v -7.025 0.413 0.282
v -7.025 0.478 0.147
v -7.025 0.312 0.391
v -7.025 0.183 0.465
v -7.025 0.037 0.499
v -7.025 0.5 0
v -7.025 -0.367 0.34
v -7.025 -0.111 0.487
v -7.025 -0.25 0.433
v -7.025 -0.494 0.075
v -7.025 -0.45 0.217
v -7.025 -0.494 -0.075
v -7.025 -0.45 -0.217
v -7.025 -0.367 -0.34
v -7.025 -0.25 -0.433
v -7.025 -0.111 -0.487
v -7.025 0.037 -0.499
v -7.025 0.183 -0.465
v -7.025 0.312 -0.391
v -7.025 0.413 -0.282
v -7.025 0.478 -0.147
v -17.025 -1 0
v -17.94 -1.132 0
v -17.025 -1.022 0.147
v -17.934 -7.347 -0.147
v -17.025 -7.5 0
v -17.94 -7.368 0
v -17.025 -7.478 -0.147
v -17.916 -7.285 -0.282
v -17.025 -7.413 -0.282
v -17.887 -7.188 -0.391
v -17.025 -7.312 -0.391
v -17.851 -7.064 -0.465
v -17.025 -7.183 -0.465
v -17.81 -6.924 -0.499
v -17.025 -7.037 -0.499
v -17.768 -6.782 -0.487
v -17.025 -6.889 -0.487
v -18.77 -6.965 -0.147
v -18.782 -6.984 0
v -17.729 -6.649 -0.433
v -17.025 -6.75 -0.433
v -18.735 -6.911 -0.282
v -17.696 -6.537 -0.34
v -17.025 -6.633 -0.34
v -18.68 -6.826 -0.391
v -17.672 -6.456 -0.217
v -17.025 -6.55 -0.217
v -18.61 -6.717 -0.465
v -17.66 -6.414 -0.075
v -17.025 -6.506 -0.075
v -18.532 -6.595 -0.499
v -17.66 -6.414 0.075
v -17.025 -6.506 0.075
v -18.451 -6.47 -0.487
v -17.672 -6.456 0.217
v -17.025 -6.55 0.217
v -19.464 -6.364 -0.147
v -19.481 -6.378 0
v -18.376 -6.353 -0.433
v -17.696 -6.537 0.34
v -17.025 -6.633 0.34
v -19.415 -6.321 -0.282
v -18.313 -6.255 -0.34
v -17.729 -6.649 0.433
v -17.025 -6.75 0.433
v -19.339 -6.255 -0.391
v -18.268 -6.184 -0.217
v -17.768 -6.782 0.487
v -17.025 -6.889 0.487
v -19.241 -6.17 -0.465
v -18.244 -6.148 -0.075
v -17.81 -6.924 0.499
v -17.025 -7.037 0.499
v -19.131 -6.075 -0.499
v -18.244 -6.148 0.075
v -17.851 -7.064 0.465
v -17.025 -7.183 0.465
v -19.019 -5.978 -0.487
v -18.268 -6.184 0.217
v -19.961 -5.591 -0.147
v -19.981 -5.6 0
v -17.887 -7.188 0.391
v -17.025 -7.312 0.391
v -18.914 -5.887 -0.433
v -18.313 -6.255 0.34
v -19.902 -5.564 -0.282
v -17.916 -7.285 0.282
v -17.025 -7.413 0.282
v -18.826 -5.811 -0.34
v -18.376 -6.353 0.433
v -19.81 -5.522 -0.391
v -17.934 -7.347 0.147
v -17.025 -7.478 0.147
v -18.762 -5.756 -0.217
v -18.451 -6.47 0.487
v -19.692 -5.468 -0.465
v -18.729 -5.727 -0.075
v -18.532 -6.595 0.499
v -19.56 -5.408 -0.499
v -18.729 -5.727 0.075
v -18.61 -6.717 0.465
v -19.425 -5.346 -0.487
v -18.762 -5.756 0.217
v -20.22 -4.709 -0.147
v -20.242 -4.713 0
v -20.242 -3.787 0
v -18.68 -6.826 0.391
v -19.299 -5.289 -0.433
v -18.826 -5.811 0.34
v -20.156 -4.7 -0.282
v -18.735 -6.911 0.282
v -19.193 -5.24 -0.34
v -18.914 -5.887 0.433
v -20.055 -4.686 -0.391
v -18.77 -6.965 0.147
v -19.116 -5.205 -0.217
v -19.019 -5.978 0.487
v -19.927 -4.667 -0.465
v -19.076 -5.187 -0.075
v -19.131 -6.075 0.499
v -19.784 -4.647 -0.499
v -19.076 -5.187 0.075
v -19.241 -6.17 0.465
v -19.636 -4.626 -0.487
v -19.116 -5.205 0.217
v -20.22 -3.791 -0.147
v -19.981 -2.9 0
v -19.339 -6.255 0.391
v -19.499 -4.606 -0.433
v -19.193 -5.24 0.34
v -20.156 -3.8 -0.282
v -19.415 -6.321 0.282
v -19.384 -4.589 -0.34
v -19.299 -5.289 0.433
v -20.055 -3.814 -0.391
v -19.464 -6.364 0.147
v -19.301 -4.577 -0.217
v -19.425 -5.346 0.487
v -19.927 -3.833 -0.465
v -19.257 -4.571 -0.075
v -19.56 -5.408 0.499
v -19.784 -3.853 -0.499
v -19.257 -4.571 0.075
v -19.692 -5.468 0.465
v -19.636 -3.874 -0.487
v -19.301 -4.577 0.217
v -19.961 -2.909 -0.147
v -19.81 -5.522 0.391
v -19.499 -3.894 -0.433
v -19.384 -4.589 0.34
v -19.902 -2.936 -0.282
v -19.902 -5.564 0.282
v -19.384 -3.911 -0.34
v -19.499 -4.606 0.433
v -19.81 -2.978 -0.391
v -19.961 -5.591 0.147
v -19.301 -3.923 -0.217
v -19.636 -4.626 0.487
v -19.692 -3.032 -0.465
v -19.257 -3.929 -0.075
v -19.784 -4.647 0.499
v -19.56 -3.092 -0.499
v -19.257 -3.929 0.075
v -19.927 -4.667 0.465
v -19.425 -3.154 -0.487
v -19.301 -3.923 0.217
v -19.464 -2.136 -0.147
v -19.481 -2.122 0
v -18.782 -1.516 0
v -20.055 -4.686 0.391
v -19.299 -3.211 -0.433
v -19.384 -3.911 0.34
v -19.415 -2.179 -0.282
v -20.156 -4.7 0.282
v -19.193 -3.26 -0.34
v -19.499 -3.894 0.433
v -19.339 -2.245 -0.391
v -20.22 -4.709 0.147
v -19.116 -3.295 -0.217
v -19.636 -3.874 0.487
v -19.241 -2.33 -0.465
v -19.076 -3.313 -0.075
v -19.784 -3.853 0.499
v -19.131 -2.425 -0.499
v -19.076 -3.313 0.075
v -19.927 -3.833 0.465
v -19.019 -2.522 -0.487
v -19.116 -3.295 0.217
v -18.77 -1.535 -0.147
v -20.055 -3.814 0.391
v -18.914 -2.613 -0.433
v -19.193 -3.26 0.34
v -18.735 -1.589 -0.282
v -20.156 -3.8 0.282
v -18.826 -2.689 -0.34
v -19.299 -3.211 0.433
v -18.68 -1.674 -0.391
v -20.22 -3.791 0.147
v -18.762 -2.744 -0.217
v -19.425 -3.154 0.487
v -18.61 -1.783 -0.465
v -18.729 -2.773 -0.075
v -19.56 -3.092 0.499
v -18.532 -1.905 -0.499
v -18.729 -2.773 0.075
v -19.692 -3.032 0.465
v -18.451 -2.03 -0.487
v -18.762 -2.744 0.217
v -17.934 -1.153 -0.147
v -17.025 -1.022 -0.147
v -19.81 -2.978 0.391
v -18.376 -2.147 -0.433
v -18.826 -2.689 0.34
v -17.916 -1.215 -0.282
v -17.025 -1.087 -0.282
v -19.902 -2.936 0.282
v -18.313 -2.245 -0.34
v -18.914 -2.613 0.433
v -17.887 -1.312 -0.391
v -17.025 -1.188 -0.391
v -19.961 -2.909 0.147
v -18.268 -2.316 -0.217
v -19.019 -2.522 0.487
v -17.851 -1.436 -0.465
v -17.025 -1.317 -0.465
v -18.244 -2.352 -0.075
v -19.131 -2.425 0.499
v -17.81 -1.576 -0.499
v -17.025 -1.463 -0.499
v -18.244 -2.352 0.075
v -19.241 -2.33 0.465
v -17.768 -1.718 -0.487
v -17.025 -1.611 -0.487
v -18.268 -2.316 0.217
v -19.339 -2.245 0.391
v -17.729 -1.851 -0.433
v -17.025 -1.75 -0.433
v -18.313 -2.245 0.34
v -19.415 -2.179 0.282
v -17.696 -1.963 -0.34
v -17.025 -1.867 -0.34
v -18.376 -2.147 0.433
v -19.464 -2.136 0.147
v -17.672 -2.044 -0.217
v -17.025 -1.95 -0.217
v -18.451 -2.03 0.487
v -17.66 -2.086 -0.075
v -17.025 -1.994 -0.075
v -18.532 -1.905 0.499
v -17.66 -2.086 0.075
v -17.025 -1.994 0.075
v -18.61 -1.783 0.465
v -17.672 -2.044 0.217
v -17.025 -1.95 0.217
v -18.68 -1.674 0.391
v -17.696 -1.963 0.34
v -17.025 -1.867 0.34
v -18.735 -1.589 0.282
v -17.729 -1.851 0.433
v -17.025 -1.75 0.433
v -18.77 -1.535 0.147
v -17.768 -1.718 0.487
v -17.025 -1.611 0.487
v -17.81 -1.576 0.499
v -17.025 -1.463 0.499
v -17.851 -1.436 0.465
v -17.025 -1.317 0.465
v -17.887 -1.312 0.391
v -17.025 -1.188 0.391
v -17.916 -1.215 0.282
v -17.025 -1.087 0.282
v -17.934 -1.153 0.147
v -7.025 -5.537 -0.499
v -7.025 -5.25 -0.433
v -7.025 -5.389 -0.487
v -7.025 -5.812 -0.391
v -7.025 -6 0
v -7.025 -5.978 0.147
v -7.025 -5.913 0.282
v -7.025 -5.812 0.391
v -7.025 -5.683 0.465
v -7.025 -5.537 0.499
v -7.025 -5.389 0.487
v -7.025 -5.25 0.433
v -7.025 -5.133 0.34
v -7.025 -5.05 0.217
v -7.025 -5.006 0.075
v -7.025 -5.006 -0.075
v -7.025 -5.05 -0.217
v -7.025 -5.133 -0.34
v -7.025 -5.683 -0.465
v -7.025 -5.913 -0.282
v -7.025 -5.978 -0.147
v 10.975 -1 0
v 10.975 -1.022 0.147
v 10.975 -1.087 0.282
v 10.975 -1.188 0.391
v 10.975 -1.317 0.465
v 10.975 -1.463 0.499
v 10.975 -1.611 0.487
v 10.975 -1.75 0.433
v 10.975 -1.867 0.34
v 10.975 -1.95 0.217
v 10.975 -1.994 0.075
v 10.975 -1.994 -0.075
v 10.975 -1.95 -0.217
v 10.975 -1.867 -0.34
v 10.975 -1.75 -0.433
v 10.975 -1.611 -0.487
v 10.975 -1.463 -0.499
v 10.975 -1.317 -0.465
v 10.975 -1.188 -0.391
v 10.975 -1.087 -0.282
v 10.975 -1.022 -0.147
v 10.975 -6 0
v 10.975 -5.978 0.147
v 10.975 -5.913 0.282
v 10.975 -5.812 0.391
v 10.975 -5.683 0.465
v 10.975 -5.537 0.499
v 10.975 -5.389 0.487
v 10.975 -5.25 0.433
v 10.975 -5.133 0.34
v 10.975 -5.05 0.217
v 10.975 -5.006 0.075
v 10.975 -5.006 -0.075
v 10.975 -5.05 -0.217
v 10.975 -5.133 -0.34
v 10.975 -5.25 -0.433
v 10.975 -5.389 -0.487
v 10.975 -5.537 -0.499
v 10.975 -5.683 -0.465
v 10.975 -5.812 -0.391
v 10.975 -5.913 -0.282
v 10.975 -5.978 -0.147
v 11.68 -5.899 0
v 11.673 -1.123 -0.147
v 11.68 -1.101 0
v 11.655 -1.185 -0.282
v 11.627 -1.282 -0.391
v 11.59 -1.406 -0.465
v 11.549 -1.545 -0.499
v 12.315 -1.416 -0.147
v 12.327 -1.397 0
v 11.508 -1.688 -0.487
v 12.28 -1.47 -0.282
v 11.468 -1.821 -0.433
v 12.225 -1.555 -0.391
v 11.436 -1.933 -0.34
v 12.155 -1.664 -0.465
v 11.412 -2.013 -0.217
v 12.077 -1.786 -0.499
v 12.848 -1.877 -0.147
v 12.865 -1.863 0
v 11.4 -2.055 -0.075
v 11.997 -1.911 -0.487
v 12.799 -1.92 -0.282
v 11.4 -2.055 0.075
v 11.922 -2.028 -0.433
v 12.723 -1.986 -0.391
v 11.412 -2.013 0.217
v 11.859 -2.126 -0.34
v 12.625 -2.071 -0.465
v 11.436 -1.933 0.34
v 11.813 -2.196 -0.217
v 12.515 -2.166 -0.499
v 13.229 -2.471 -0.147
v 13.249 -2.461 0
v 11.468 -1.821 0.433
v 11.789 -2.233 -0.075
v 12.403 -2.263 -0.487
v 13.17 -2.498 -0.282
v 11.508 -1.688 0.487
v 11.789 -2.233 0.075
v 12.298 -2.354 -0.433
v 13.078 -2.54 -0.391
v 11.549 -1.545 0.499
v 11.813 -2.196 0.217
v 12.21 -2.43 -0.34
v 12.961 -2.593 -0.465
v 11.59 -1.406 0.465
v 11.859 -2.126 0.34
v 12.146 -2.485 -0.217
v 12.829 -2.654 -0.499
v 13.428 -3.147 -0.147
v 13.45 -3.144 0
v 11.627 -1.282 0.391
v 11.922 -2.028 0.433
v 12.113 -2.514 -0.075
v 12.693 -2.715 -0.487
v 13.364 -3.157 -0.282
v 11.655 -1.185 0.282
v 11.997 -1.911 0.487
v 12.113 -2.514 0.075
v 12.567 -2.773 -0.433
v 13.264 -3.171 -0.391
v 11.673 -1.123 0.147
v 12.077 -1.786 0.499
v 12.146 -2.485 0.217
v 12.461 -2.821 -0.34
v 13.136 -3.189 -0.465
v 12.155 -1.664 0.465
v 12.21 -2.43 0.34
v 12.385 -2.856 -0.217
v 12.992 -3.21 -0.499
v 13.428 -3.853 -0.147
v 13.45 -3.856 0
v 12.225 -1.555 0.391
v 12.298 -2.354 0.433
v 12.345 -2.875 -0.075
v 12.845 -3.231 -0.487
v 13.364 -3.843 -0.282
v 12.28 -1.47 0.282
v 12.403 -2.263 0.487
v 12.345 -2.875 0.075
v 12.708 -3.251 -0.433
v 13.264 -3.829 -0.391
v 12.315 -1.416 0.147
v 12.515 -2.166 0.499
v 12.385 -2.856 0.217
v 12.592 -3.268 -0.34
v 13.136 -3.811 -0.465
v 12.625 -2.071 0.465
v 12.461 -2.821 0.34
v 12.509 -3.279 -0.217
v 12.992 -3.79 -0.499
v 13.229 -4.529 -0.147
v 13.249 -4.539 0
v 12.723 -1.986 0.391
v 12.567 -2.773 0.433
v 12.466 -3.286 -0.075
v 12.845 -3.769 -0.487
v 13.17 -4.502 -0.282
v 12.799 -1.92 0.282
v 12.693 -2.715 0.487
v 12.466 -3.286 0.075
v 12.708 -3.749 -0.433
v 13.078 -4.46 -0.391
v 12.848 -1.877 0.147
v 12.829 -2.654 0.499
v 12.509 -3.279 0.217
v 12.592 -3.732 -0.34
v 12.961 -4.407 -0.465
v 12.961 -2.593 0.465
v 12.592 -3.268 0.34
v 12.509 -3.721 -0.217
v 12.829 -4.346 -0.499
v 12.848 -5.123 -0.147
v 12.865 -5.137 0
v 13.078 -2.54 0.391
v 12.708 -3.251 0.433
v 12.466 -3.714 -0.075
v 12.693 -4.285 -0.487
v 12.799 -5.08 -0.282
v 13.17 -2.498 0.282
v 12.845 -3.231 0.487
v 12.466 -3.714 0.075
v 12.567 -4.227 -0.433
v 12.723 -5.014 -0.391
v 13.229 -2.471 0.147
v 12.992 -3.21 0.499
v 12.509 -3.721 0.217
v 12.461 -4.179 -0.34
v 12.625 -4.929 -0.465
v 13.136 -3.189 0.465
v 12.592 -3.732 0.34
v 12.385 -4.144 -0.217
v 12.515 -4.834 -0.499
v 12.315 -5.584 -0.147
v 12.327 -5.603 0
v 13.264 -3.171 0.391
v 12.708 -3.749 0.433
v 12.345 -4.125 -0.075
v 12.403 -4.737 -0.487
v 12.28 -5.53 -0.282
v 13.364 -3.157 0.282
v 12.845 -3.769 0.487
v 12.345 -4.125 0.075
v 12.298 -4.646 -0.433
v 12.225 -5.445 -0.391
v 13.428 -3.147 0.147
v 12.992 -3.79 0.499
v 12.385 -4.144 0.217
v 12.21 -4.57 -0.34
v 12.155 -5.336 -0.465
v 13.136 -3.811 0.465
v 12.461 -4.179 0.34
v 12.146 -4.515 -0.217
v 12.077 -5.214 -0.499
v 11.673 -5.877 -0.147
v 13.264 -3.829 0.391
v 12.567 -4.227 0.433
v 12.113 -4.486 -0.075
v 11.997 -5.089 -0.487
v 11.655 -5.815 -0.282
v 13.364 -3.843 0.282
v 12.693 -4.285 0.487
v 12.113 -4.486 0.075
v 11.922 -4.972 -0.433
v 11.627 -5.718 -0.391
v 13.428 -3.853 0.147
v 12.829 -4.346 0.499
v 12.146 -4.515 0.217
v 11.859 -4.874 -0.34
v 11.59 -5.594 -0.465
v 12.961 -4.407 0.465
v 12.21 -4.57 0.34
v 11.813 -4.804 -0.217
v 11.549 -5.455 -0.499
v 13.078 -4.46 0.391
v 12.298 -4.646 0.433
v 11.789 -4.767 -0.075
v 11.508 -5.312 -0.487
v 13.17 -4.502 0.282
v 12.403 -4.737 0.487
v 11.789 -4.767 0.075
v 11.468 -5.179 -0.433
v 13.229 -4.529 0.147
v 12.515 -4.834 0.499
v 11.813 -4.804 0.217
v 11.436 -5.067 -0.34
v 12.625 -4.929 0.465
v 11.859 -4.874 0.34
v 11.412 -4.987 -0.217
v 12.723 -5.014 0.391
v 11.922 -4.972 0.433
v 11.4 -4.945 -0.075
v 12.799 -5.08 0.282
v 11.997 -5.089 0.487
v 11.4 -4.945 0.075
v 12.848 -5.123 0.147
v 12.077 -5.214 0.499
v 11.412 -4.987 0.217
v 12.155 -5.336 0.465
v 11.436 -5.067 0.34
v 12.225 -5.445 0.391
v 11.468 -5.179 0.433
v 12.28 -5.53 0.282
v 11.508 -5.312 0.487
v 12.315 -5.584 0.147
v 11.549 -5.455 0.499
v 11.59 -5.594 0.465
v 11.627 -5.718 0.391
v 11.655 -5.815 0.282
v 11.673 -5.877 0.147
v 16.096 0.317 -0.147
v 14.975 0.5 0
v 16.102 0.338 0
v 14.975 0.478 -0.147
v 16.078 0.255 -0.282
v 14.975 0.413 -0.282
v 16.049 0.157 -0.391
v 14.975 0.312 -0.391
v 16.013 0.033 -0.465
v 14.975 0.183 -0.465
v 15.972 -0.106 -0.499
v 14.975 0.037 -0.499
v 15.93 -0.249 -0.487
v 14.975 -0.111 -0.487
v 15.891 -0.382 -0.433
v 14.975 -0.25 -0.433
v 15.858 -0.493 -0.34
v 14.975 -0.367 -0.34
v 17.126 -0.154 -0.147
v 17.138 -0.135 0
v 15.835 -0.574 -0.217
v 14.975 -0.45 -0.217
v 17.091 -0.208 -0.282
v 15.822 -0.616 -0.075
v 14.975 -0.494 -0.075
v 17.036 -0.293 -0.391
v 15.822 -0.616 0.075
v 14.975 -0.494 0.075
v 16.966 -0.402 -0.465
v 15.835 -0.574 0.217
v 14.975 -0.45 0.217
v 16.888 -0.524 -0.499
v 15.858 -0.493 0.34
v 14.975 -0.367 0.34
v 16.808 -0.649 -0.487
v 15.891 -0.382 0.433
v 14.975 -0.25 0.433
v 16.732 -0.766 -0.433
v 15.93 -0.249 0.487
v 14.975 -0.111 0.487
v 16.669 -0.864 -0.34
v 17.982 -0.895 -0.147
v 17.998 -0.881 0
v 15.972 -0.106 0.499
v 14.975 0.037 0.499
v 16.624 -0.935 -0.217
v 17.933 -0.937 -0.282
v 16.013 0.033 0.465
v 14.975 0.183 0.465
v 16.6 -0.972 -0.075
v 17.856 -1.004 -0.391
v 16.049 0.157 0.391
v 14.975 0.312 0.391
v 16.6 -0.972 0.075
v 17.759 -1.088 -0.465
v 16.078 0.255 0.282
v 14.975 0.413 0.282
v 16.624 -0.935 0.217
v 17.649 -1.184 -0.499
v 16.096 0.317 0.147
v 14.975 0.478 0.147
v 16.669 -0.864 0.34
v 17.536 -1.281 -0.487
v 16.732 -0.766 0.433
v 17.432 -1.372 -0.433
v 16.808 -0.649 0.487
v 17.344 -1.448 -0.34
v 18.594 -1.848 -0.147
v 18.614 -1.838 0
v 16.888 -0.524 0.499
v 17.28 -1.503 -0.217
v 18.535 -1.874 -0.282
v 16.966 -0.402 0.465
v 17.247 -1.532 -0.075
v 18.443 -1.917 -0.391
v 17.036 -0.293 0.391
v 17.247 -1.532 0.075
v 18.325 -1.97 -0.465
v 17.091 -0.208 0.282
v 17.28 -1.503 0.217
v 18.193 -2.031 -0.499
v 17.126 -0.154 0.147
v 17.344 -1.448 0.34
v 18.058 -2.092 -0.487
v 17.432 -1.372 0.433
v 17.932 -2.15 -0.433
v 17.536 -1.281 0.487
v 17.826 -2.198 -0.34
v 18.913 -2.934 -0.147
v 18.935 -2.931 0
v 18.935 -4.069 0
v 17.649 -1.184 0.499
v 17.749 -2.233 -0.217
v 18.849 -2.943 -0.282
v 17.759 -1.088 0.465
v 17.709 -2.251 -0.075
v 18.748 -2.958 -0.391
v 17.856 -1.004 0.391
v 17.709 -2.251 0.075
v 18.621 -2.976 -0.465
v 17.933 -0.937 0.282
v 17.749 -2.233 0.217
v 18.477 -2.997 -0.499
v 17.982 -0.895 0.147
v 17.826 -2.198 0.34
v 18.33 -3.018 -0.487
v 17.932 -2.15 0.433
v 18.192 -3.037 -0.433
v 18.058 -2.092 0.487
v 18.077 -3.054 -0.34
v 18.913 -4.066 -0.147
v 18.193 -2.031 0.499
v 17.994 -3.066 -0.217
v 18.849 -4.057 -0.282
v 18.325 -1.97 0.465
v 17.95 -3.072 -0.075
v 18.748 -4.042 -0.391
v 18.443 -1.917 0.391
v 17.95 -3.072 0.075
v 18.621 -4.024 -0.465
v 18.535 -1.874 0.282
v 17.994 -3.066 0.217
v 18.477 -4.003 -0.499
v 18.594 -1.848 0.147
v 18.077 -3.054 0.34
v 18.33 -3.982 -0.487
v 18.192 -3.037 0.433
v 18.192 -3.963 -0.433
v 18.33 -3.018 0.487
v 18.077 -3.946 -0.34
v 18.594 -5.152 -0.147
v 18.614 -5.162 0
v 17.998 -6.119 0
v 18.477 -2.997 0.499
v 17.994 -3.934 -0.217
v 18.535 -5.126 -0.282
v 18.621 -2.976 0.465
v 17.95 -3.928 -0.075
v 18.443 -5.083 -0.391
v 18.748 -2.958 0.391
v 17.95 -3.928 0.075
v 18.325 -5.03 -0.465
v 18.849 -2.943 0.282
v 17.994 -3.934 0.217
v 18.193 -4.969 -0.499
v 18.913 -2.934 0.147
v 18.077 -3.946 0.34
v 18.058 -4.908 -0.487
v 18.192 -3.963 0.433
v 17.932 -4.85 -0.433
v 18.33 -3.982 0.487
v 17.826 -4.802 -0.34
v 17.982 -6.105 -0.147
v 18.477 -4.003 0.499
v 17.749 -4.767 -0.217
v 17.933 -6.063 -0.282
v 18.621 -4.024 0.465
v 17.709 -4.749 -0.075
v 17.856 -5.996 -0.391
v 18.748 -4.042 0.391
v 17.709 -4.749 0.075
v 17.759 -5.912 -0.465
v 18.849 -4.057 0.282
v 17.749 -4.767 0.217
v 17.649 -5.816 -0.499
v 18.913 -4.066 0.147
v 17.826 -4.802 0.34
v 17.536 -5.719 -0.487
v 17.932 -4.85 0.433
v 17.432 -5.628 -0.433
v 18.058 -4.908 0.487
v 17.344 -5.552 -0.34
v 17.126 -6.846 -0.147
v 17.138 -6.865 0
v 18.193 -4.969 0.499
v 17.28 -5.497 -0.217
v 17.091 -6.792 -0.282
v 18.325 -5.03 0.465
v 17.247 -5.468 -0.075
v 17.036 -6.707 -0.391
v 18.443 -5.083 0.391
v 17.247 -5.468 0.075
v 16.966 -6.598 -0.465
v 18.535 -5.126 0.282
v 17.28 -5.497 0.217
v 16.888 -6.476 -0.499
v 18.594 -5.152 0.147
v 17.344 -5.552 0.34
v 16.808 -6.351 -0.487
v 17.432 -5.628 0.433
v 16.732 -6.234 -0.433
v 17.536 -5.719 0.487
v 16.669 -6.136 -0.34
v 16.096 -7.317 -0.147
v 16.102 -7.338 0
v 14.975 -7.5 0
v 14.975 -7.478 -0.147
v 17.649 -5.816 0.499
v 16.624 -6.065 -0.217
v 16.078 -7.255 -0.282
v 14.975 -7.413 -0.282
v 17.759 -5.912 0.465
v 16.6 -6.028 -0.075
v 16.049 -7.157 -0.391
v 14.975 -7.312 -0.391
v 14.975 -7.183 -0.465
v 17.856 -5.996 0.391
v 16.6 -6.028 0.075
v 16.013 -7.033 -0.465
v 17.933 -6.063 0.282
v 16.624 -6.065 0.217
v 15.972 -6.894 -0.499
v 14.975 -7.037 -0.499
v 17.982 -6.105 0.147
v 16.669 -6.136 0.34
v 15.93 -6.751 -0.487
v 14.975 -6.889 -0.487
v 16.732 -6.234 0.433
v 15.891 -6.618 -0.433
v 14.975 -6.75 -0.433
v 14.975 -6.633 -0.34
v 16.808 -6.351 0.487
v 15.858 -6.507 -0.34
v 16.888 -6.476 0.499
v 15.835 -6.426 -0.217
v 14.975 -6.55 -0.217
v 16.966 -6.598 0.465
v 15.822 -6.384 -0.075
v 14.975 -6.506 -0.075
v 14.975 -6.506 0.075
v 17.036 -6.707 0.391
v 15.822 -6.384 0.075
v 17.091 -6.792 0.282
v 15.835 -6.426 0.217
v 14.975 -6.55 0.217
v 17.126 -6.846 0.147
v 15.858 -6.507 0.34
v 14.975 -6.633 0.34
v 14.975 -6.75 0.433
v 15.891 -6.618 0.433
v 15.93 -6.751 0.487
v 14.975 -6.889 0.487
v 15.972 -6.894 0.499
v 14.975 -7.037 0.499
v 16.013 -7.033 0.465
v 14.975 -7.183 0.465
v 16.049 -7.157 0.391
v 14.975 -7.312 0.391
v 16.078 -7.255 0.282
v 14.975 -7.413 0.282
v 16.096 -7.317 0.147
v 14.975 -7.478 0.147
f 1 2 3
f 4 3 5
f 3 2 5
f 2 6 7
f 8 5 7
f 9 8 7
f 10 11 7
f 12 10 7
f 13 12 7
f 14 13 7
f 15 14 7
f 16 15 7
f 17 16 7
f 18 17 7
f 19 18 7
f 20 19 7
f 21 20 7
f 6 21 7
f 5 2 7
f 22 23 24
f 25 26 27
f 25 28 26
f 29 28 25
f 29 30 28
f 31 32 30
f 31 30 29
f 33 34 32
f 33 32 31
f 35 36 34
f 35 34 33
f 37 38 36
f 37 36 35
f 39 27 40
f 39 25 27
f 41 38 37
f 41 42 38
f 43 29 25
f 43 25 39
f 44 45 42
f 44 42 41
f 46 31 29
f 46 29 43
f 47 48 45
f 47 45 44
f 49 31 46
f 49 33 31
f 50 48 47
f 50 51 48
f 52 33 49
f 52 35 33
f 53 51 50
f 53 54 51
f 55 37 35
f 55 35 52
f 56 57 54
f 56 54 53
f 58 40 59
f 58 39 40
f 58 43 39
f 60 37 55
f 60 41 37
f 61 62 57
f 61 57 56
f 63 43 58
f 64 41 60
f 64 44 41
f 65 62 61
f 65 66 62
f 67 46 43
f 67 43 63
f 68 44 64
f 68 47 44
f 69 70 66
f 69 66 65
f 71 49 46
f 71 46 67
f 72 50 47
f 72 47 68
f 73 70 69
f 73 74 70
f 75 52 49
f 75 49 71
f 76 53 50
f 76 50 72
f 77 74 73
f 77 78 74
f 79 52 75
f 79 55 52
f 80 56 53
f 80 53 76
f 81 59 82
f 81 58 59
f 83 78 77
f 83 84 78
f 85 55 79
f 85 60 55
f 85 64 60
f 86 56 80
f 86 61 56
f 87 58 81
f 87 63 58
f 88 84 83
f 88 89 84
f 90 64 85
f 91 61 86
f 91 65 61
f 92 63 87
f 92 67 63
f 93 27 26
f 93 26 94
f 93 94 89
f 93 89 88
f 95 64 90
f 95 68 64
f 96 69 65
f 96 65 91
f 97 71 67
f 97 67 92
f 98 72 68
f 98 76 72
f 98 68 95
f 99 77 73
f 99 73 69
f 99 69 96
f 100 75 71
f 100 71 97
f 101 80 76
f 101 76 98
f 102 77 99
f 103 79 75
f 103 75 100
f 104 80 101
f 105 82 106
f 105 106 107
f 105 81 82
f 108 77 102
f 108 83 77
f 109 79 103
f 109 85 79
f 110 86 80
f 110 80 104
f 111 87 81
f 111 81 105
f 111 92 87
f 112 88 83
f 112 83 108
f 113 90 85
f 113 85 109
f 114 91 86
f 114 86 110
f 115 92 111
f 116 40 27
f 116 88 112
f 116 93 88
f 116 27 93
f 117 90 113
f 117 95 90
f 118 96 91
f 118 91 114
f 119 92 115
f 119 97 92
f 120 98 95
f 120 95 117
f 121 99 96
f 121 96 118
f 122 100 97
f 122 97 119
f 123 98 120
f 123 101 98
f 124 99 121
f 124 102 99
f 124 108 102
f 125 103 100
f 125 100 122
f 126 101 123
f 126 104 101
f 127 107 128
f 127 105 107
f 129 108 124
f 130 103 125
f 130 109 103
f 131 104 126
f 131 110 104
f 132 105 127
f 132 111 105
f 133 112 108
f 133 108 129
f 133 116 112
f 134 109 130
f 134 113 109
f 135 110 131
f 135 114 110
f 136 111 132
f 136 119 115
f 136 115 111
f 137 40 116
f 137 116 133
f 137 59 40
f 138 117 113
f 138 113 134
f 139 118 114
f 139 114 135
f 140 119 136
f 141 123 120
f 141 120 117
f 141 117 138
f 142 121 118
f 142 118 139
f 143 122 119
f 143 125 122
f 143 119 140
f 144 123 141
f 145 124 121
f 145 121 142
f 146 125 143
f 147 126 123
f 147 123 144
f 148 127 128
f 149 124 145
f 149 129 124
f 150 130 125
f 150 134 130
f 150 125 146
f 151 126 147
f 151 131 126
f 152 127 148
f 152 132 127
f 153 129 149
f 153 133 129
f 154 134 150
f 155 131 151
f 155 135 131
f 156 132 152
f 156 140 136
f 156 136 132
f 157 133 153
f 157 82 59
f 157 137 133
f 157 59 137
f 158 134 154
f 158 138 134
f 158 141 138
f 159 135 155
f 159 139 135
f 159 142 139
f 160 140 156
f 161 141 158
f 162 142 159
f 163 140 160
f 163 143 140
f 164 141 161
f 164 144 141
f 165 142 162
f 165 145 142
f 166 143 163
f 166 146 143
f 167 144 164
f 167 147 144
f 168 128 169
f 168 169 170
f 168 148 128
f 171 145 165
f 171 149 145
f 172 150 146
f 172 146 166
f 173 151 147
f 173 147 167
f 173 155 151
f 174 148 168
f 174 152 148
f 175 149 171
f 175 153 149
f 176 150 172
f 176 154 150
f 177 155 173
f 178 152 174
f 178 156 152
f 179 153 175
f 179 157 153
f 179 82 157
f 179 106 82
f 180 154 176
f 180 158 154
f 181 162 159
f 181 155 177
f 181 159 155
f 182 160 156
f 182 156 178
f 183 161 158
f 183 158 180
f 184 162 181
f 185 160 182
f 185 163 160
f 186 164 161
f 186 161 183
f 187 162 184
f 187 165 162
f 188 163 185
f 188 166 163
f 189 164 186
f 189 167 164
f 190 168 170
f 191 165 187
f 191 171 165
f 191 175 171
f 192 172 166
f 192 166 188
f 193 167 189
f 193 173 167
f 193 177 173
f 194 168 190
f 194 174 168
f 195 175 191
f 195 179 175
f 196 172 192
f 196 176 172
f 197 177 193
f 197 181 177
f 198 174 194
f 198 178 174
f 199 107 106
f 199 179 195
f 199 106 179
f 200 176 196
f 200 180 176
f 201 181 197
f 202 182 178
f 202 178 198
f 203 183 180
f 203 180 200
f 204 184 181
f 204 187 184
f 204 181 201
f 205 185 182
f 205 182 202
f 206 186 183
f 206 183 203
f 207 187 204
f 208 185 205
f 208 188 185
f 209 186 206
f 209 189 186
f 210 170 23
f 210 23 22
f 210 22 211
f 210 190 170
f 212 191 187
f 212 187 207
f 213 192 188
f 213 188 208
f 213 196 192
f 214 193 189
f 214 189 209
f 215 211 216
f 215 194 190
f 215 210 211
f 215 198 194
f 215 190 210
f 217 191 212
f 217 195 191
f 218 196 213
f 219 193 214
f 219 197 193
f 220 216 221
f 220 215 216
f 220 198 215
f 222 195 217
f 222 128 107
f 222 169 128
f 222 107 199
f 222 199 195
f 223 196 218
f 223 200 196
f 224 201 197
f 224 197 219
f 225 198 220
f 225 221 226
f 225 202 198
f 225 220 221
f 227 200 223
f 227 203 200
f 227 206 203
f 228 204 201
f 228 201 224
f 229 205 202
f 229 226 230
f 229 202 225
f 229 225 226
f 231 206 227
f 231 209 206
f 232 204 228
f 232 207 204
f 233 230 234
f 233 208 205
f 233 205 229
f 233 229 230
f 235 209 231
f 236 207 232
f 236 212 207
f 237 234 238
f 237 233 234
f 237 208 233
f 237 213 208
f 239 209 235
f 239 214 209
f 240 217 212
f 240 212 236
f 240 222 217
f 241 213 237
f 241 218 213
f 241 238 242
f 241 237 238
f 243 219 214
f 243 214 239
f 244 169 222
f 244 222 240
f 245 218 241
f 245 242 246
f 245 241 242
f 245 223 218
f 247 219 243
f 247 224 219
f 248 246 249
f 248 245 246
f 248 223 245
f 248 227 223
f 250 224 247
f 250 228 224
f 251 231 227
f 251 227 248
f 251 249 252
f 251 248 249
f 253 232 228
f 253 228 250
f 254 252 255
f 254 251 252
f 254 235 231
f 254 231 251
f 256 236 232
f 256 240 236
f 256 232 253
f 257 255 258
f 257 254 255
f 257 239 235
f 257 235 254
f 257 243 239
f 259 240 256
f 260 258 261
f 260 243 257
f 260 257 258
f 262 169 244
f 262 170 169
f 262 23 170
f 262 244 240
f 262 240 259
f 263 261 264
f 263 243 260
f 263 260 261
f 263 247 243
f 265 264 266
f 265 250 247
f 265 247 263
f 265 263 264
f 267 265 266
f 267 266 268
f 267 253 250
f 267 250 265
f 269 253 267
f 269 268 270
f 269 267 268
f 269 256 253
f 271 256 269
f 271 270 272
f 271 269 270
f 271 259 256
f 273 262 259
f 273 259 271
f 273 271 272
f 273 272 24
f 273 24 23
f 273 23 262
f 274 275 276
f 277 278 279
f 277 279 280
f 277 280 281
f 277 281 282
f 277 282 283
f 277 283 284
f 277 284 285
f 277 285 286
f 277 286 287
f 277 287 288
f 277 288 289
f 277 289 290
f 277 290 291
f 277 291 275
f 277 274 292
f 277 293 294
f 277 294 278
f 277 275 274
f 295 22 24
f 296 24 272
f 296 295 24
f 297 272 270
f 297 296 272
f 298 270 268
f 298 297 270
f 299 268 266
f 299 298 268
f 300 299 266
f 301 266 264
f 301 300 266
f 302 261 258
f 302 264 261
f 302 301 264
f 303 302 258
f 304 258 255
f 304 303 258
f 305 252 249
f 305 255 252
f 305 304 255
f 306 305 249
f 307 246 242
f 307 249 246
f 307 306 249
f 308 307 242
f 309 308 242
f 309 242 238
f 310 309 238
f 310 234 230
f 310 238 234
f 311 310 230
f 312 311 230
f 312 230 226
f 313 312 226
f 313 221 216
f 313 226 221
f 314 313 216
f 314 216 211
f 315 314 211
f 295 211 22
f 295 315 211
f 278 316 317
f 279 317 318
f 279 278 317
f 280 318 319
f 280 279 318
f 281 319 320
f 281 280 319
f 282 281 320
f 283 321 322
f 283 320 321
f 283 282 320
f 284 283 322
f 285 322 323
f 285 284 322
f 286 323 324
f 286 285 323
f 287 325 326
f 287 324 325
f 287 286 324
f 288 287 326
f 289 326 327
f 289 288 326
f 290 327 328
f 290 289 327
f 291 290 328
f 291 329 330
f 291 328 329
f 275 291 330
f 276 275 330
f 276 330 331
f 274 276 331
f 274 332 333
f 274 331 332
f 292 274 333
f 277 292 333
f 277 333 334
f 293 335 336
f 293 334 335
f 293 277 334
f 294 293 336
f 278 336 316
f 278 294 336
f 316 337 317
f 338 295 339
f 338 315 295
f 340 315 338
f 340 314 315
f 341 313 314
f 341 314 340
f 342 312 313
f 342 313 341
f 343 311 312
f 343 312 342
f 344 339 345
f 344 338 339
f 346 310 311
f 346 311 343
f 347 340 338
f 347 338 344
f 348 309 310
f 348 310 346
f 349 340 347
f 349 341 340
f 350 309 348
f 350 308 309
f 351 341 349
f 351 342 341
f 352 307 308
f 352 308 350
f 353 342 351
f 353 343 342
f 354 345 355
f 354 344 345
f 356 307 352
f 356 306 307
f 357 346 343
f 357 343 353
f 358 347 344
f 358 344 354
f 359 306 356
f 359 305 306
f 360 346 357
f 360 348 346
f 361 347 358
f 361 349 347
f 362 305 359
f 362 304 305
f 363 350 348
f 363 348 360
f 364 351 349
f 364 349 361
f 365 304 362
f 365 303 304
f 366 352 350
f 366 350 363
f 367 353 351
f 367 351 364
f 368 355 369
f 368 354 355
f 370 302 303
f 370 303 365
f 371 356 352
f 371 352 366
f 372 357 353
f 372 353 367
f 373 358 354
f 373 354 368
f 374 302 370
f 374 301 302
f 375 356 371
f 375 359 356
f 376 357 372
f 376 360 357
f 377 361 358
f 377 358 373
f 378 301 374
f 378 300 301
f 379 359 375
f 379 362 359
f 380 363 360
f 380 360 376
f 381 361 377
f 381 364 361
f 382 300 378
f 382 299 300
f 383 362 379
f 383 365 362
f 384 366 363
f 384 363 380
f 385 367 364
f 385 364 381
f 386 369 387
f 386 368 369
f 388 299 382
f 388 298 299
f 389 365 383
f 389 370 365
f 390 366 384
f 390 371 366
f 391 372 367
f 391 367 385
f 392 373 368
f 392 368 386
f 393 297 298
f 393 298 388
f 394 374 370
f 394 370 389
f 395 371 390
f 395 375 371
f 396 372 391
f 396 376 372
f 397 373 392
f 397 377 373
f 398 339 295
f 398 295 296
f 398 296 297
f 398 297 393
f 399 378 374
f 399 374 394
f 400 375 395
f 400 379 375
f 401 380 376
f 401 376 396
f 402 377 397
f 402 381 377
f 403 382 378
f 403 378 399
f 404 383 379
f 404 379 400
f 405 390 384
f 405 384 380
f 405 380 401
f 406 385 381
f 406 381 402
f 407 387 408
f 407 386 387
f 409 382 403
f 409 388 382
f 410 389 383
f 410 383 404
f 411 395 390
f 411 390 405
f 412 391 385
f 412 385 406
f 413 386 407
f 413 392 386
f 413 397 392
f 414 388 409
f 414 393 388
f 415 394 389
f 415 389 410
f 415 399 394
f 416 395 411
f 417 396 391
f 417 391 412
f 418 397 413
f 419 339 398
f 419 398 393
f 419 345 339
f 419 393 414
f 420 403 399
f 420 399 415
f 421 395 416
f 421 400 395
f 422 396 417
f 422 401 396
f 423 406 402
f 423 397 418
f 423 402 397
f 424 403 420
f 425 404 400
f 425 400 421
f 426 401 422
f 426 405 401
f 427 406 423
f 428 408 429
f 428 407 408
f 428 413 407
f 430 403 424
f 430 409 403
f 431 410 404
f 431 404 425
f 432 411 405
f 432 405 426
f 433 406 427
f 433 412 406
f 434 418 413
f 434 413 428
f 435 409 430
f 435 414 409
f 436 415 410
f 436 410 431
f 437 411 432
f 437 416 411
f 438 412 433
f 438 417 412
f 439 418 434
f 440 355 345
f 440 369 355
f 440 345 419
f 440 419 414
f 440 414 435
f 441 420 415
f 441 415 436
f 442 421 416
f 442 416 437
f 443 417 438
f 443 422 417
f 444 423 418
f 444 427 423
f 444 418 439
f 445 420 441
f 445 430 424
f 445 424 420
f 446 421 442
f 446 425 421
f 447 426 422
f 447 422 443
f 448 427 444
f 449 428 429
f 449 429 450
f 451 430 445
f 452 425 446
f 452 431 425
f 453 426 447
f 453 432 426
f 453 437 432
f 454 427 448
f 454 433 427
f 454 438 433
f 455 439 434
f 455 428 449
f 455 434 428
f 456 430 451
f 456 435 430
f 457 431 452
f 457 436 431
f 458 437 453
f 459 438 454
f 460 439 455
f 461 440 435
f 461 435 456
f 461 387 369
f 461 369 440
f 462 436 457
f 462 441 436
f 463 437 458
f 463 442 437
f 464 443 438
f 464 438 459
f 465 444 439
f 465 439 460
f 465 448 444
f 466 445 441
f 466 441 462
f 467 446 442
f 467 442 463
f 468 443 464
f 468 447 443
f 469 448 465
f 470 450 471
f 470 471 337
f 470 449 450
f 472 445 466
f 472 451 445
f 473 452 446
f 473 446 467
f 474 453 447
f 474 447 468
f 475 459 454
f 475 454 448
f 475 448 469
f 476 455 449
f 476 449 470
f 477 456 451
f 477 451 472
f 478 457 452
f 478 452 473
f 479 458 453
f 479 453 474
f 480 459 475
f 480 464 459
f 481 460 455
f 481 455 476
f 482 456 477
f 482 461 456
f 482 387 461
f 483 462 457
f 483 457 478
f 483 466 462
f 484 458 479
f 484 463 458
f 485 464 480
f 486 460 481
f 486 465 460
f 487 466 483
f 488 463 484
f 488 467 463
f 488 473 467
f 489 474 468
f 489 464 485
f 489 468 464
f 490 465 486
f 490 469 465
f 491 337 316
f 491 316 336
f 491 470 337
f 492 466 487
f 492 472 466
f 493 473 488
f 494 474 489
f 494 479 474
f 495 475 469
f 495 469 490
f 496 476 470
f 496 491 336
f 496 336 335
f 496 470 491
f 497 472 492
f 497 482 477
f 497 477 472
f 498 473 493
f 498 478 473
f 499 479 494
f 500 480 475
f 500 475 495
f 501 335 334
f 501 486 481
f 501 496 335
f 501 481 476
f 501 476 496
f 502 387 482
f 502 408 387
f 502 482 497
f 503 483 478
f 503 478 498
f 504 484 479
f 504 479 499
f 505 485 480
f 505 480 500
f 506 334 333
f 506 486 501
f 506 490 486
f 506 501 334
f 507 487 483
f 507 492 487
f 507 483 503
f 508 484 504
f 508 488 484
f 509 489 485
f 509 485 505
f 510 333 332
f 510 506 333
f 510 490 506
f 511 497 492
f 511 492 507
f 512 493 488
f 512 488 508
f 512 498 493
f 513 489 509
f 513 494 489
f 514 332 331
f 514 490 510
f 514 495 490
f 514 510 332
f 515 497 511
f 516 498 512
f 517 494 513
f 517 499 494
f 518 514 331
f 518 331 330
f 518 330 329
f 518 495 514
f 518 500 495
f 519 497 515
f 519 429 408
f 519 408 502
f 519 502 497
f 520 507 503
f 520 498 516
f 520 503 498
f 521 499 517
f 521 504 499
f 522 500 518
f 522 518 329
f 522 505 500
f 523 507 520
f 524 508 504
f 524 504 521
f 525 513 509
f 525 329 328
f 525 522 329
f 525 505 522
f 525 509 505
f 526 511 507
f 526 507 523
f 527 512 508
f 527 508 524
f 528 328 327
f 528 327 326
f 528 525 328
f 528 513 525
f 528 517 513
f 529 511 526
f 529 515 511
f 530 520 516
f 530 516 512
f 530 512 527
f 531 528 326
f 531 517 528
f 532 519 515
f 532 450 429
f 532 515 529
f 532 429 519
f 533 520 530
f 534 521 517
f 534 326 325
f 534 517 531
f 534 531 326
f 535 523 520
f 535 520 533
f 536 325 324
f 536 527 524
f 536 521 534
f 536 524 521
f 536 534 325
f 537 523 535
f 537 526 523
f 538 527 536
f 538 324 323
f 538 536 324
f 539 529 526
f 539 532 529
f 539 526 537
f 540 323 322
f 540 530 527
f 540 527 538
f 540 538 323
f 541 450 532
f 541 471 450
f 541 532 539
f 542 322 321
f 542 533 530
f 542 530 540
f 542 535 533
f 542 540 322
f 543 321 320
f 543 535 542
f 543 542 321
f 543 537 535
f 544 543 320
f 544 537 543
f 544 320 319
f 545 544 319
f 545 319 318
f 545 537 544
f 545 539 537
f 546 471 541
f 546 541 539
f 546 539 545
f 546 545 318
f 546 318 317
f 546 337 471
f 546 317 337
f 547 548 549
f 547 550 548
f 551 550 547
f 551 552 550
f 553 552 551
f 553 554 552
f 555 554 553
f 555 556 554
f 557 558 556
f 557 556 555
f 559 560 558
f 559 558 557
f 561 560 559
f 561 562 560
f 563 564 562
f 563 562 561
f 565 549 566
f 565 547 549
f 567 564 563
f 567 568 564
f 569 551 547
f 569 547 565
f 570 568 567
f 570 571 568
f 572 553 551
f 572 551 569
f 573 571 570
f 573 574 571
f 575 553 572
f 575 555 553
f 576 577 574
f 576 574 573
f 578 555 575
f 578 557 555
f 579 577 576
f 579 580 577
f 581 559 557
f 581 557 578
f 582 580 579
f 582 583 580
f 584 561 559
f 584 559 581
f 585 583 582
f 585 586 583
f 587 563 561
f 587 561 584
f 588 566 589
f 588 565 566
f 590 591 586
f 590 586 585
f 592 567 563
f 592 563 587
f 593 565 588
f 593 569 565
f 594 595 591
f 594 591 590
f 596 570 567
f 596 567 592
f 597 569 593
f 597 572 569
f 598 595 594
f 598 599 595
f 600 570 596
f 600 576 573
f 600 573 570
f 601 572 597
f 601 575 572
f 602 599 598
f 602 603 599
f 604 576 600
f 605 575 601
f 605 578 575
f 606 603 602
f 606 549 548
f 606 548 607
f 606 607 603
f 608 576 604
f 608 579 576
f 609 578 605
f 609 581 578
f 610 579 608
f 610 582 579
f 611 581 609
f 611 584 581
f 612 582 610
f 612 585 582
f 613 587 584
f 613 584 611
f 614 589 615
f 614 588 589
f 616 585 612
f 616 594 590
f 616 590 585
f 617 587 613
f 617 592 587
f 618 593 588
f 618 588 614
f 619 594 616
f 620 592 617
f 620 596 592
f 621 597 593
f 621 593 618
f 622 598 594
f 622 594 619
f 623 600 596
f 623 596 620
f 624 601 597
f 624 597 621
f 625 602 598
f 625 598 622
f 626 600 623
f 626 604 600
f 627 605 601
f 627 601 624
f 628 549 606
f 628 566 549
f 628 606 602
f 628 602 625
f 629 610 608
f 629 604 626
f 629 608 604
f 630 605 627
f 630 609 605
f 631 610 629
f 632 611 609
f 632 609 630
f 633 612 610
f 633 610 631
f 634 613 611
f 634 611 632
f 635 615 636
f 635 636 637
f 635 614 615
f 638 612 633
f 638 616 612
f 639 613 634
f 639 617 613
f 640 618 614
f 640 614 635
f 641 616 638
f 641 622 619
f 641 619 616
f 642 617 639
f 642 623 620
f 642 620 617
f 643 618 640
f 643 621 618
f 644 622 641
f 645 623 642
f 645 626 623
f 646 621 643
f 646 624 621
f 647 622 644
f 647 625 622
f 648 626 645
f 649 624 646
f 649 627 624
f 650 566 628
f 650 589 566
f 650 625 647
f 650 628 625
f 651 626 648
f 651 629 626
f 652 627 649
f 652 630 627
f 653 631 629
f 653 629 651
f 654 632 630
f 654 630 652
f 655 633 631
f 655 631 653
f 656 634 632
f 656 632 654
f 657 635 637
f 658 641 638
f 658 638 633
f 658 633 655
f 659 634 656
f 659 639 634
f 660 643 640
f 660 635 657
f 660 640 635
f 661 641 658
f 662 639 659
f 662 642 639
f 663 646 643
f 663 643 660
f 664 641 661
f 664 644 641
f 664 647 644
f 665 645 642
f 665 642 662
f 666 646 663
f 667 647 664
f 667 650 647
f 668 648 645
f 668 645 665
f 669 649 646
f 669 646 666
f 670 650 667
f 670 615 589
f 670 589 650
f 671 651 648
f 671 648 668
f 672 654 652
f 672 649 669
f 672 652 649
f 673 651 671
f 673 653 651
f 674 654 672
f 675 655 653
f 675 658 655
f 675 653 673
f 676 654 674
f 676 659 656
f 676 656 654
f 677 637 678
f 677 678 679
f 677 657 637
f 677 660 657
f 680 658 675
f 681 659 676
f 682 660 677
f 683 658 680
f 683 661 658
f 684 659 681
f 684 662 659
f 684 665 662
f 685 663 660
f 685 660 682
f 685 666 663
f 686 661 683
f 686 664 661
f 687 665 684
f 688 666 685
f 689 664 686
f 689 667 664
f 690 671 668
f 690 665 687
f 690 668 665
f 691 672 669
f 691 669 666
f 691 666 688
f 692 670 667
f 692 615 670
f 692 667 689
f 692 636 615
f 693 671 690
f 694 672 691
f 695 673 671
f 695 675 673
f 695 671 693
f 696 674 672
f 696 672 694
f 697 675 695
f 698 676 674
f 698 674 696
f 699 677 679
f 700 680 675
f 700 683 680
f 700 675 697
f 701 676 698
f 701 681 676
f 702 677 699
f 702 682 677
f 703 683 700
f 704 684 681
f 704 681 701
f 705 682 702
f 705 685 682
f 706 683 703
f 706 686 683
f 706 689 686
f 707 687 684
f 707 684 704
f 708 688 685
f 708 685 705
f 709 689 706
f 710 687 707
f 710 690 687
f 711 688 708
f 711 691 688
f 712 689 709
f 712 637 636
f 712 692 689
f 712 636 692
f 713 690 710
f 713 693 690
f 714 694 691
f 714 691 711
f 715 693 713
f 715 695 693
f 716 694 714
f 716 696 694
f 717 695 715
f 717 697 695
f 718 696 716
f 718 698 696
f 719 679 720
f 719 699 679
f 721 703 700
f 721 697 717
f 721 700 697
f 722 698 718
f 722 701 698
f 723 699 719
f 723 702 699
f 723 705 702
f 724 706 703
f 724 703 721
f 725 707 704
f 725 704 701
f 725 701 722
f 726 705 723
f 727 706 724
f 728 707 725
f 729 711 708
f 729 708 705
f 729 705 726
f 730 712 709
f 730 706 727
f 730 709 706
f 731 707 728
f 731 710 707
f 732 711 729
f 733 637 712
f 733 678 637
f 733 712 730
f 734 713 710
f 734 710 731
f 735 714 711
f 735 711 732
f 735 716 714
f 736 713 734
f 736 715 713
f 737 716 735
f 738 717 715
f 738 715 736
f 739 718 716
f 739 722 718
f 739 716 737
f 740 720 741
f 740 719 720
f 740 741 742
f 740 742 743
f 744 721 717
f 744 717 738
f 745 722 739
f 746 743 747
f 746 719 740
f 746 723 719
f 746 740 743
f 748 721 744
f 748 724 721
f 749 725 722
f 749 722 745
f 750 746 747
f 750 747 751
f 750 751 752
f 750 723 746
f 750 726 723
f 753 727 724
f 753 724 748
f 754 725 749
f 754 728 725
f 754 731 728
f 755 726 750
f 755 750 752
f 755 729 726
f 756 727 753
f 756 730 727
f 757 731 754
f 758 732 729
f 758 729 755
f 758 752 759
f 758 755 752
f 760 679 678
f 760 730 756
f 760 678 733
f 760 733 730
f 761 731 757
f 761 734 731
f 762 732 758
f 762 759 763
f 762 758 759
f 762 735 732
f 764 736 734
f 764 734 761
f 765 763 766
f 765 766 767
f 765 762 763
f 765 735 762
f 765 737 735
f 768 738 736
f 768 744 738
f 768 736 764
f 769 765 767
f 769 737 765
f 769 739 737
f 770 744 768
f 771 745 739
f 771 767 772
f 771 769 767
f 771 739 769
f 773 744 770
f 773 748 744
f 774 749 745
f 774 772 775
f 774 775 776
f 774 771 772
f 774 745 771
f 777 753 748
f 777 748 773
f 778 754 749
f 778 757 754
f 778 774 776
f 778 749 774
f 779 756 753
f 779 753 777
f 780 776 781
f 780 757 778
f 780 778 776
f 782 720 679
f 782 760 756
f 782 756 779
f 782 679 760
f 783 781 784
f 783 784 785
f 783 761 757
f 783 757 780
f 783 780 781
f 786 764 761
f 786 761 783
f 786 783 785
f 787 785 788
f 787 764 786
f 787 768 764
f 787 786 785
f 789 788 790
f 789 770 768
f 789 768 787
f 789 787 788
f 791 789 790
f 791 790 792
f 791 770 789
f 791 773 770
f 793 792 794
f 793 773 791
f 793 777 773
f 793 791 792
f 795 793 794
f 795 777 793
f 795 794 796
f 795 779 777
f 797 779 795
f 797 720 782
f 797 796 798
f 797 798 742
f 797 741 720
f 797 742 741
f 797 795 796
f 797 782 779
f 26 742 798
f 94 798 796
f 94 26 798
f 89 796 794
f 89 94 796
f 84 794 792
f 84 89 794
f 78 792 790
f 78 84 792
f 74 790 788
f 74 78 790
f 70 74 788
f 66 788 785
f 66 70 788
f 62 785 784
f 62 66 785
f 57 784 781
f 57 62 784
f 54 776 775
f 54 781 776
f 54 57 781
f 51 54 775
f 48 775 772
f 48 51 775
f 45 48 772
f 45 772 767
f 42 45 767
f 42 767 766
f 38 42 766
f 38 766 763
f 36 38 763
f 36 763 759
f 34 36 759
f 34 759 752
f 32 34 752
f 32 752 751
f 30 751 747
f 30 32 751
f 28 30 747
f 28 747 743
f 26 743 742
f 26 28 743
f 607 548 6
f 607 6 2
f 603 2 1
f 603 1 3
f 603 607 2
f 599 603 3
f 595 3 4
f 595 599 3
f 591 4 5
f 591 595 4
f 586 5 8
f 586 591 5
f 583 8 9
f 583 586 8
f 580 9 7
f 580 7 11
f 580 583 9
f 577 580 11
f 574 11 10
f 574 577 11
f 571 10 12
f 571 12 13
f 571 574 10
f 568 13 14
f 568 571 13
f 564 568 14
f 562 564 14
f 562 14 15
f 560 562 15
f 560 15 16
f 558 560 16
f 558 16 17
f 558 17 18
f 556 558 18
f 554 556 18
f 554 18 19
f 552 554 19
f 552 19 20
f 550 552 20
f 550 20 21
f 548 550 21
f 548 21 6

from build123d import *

# Parameters (mm, degrees)
SWEEP1_PROFILE_R = 0.5


with BuildPart() as part:
    # Sweep1: sweep along a path in Sketch1
    with BuildLine(Plane.XY) as sweep1_path:
        Line((-7.024590164, 0), (14.975409836, 0))
        ThreePointArc((14.975409836, 0), (18.475409836, -3.5), (14.975409836, -7))
        Line((14.975409836, -7), (-17.024590164, -7))
        ThreePointArc((-17.024590164, -7), (-19.774590164, -4.25), (-17.024590164, -1.5))
        Line((-17.024590164, -1.5), (10.975409836, -1.5))
        ThreePointArc((10.975409836, -1.5), (12.975409836, -3.5), (10.975409836, -5.5))
        Line((10.975409836, -5.5), (-7.024590164, -5.5))
    # Sweep1 profile (on start of the path) → Sweep1 (sweep)
    with BuildSketch(Plane.YZ.offset(-7.024590164)):
        Circle(SWEEP1_PROFILE_R)
    sweep(path=sweep1_path.line)


solid = part.part
